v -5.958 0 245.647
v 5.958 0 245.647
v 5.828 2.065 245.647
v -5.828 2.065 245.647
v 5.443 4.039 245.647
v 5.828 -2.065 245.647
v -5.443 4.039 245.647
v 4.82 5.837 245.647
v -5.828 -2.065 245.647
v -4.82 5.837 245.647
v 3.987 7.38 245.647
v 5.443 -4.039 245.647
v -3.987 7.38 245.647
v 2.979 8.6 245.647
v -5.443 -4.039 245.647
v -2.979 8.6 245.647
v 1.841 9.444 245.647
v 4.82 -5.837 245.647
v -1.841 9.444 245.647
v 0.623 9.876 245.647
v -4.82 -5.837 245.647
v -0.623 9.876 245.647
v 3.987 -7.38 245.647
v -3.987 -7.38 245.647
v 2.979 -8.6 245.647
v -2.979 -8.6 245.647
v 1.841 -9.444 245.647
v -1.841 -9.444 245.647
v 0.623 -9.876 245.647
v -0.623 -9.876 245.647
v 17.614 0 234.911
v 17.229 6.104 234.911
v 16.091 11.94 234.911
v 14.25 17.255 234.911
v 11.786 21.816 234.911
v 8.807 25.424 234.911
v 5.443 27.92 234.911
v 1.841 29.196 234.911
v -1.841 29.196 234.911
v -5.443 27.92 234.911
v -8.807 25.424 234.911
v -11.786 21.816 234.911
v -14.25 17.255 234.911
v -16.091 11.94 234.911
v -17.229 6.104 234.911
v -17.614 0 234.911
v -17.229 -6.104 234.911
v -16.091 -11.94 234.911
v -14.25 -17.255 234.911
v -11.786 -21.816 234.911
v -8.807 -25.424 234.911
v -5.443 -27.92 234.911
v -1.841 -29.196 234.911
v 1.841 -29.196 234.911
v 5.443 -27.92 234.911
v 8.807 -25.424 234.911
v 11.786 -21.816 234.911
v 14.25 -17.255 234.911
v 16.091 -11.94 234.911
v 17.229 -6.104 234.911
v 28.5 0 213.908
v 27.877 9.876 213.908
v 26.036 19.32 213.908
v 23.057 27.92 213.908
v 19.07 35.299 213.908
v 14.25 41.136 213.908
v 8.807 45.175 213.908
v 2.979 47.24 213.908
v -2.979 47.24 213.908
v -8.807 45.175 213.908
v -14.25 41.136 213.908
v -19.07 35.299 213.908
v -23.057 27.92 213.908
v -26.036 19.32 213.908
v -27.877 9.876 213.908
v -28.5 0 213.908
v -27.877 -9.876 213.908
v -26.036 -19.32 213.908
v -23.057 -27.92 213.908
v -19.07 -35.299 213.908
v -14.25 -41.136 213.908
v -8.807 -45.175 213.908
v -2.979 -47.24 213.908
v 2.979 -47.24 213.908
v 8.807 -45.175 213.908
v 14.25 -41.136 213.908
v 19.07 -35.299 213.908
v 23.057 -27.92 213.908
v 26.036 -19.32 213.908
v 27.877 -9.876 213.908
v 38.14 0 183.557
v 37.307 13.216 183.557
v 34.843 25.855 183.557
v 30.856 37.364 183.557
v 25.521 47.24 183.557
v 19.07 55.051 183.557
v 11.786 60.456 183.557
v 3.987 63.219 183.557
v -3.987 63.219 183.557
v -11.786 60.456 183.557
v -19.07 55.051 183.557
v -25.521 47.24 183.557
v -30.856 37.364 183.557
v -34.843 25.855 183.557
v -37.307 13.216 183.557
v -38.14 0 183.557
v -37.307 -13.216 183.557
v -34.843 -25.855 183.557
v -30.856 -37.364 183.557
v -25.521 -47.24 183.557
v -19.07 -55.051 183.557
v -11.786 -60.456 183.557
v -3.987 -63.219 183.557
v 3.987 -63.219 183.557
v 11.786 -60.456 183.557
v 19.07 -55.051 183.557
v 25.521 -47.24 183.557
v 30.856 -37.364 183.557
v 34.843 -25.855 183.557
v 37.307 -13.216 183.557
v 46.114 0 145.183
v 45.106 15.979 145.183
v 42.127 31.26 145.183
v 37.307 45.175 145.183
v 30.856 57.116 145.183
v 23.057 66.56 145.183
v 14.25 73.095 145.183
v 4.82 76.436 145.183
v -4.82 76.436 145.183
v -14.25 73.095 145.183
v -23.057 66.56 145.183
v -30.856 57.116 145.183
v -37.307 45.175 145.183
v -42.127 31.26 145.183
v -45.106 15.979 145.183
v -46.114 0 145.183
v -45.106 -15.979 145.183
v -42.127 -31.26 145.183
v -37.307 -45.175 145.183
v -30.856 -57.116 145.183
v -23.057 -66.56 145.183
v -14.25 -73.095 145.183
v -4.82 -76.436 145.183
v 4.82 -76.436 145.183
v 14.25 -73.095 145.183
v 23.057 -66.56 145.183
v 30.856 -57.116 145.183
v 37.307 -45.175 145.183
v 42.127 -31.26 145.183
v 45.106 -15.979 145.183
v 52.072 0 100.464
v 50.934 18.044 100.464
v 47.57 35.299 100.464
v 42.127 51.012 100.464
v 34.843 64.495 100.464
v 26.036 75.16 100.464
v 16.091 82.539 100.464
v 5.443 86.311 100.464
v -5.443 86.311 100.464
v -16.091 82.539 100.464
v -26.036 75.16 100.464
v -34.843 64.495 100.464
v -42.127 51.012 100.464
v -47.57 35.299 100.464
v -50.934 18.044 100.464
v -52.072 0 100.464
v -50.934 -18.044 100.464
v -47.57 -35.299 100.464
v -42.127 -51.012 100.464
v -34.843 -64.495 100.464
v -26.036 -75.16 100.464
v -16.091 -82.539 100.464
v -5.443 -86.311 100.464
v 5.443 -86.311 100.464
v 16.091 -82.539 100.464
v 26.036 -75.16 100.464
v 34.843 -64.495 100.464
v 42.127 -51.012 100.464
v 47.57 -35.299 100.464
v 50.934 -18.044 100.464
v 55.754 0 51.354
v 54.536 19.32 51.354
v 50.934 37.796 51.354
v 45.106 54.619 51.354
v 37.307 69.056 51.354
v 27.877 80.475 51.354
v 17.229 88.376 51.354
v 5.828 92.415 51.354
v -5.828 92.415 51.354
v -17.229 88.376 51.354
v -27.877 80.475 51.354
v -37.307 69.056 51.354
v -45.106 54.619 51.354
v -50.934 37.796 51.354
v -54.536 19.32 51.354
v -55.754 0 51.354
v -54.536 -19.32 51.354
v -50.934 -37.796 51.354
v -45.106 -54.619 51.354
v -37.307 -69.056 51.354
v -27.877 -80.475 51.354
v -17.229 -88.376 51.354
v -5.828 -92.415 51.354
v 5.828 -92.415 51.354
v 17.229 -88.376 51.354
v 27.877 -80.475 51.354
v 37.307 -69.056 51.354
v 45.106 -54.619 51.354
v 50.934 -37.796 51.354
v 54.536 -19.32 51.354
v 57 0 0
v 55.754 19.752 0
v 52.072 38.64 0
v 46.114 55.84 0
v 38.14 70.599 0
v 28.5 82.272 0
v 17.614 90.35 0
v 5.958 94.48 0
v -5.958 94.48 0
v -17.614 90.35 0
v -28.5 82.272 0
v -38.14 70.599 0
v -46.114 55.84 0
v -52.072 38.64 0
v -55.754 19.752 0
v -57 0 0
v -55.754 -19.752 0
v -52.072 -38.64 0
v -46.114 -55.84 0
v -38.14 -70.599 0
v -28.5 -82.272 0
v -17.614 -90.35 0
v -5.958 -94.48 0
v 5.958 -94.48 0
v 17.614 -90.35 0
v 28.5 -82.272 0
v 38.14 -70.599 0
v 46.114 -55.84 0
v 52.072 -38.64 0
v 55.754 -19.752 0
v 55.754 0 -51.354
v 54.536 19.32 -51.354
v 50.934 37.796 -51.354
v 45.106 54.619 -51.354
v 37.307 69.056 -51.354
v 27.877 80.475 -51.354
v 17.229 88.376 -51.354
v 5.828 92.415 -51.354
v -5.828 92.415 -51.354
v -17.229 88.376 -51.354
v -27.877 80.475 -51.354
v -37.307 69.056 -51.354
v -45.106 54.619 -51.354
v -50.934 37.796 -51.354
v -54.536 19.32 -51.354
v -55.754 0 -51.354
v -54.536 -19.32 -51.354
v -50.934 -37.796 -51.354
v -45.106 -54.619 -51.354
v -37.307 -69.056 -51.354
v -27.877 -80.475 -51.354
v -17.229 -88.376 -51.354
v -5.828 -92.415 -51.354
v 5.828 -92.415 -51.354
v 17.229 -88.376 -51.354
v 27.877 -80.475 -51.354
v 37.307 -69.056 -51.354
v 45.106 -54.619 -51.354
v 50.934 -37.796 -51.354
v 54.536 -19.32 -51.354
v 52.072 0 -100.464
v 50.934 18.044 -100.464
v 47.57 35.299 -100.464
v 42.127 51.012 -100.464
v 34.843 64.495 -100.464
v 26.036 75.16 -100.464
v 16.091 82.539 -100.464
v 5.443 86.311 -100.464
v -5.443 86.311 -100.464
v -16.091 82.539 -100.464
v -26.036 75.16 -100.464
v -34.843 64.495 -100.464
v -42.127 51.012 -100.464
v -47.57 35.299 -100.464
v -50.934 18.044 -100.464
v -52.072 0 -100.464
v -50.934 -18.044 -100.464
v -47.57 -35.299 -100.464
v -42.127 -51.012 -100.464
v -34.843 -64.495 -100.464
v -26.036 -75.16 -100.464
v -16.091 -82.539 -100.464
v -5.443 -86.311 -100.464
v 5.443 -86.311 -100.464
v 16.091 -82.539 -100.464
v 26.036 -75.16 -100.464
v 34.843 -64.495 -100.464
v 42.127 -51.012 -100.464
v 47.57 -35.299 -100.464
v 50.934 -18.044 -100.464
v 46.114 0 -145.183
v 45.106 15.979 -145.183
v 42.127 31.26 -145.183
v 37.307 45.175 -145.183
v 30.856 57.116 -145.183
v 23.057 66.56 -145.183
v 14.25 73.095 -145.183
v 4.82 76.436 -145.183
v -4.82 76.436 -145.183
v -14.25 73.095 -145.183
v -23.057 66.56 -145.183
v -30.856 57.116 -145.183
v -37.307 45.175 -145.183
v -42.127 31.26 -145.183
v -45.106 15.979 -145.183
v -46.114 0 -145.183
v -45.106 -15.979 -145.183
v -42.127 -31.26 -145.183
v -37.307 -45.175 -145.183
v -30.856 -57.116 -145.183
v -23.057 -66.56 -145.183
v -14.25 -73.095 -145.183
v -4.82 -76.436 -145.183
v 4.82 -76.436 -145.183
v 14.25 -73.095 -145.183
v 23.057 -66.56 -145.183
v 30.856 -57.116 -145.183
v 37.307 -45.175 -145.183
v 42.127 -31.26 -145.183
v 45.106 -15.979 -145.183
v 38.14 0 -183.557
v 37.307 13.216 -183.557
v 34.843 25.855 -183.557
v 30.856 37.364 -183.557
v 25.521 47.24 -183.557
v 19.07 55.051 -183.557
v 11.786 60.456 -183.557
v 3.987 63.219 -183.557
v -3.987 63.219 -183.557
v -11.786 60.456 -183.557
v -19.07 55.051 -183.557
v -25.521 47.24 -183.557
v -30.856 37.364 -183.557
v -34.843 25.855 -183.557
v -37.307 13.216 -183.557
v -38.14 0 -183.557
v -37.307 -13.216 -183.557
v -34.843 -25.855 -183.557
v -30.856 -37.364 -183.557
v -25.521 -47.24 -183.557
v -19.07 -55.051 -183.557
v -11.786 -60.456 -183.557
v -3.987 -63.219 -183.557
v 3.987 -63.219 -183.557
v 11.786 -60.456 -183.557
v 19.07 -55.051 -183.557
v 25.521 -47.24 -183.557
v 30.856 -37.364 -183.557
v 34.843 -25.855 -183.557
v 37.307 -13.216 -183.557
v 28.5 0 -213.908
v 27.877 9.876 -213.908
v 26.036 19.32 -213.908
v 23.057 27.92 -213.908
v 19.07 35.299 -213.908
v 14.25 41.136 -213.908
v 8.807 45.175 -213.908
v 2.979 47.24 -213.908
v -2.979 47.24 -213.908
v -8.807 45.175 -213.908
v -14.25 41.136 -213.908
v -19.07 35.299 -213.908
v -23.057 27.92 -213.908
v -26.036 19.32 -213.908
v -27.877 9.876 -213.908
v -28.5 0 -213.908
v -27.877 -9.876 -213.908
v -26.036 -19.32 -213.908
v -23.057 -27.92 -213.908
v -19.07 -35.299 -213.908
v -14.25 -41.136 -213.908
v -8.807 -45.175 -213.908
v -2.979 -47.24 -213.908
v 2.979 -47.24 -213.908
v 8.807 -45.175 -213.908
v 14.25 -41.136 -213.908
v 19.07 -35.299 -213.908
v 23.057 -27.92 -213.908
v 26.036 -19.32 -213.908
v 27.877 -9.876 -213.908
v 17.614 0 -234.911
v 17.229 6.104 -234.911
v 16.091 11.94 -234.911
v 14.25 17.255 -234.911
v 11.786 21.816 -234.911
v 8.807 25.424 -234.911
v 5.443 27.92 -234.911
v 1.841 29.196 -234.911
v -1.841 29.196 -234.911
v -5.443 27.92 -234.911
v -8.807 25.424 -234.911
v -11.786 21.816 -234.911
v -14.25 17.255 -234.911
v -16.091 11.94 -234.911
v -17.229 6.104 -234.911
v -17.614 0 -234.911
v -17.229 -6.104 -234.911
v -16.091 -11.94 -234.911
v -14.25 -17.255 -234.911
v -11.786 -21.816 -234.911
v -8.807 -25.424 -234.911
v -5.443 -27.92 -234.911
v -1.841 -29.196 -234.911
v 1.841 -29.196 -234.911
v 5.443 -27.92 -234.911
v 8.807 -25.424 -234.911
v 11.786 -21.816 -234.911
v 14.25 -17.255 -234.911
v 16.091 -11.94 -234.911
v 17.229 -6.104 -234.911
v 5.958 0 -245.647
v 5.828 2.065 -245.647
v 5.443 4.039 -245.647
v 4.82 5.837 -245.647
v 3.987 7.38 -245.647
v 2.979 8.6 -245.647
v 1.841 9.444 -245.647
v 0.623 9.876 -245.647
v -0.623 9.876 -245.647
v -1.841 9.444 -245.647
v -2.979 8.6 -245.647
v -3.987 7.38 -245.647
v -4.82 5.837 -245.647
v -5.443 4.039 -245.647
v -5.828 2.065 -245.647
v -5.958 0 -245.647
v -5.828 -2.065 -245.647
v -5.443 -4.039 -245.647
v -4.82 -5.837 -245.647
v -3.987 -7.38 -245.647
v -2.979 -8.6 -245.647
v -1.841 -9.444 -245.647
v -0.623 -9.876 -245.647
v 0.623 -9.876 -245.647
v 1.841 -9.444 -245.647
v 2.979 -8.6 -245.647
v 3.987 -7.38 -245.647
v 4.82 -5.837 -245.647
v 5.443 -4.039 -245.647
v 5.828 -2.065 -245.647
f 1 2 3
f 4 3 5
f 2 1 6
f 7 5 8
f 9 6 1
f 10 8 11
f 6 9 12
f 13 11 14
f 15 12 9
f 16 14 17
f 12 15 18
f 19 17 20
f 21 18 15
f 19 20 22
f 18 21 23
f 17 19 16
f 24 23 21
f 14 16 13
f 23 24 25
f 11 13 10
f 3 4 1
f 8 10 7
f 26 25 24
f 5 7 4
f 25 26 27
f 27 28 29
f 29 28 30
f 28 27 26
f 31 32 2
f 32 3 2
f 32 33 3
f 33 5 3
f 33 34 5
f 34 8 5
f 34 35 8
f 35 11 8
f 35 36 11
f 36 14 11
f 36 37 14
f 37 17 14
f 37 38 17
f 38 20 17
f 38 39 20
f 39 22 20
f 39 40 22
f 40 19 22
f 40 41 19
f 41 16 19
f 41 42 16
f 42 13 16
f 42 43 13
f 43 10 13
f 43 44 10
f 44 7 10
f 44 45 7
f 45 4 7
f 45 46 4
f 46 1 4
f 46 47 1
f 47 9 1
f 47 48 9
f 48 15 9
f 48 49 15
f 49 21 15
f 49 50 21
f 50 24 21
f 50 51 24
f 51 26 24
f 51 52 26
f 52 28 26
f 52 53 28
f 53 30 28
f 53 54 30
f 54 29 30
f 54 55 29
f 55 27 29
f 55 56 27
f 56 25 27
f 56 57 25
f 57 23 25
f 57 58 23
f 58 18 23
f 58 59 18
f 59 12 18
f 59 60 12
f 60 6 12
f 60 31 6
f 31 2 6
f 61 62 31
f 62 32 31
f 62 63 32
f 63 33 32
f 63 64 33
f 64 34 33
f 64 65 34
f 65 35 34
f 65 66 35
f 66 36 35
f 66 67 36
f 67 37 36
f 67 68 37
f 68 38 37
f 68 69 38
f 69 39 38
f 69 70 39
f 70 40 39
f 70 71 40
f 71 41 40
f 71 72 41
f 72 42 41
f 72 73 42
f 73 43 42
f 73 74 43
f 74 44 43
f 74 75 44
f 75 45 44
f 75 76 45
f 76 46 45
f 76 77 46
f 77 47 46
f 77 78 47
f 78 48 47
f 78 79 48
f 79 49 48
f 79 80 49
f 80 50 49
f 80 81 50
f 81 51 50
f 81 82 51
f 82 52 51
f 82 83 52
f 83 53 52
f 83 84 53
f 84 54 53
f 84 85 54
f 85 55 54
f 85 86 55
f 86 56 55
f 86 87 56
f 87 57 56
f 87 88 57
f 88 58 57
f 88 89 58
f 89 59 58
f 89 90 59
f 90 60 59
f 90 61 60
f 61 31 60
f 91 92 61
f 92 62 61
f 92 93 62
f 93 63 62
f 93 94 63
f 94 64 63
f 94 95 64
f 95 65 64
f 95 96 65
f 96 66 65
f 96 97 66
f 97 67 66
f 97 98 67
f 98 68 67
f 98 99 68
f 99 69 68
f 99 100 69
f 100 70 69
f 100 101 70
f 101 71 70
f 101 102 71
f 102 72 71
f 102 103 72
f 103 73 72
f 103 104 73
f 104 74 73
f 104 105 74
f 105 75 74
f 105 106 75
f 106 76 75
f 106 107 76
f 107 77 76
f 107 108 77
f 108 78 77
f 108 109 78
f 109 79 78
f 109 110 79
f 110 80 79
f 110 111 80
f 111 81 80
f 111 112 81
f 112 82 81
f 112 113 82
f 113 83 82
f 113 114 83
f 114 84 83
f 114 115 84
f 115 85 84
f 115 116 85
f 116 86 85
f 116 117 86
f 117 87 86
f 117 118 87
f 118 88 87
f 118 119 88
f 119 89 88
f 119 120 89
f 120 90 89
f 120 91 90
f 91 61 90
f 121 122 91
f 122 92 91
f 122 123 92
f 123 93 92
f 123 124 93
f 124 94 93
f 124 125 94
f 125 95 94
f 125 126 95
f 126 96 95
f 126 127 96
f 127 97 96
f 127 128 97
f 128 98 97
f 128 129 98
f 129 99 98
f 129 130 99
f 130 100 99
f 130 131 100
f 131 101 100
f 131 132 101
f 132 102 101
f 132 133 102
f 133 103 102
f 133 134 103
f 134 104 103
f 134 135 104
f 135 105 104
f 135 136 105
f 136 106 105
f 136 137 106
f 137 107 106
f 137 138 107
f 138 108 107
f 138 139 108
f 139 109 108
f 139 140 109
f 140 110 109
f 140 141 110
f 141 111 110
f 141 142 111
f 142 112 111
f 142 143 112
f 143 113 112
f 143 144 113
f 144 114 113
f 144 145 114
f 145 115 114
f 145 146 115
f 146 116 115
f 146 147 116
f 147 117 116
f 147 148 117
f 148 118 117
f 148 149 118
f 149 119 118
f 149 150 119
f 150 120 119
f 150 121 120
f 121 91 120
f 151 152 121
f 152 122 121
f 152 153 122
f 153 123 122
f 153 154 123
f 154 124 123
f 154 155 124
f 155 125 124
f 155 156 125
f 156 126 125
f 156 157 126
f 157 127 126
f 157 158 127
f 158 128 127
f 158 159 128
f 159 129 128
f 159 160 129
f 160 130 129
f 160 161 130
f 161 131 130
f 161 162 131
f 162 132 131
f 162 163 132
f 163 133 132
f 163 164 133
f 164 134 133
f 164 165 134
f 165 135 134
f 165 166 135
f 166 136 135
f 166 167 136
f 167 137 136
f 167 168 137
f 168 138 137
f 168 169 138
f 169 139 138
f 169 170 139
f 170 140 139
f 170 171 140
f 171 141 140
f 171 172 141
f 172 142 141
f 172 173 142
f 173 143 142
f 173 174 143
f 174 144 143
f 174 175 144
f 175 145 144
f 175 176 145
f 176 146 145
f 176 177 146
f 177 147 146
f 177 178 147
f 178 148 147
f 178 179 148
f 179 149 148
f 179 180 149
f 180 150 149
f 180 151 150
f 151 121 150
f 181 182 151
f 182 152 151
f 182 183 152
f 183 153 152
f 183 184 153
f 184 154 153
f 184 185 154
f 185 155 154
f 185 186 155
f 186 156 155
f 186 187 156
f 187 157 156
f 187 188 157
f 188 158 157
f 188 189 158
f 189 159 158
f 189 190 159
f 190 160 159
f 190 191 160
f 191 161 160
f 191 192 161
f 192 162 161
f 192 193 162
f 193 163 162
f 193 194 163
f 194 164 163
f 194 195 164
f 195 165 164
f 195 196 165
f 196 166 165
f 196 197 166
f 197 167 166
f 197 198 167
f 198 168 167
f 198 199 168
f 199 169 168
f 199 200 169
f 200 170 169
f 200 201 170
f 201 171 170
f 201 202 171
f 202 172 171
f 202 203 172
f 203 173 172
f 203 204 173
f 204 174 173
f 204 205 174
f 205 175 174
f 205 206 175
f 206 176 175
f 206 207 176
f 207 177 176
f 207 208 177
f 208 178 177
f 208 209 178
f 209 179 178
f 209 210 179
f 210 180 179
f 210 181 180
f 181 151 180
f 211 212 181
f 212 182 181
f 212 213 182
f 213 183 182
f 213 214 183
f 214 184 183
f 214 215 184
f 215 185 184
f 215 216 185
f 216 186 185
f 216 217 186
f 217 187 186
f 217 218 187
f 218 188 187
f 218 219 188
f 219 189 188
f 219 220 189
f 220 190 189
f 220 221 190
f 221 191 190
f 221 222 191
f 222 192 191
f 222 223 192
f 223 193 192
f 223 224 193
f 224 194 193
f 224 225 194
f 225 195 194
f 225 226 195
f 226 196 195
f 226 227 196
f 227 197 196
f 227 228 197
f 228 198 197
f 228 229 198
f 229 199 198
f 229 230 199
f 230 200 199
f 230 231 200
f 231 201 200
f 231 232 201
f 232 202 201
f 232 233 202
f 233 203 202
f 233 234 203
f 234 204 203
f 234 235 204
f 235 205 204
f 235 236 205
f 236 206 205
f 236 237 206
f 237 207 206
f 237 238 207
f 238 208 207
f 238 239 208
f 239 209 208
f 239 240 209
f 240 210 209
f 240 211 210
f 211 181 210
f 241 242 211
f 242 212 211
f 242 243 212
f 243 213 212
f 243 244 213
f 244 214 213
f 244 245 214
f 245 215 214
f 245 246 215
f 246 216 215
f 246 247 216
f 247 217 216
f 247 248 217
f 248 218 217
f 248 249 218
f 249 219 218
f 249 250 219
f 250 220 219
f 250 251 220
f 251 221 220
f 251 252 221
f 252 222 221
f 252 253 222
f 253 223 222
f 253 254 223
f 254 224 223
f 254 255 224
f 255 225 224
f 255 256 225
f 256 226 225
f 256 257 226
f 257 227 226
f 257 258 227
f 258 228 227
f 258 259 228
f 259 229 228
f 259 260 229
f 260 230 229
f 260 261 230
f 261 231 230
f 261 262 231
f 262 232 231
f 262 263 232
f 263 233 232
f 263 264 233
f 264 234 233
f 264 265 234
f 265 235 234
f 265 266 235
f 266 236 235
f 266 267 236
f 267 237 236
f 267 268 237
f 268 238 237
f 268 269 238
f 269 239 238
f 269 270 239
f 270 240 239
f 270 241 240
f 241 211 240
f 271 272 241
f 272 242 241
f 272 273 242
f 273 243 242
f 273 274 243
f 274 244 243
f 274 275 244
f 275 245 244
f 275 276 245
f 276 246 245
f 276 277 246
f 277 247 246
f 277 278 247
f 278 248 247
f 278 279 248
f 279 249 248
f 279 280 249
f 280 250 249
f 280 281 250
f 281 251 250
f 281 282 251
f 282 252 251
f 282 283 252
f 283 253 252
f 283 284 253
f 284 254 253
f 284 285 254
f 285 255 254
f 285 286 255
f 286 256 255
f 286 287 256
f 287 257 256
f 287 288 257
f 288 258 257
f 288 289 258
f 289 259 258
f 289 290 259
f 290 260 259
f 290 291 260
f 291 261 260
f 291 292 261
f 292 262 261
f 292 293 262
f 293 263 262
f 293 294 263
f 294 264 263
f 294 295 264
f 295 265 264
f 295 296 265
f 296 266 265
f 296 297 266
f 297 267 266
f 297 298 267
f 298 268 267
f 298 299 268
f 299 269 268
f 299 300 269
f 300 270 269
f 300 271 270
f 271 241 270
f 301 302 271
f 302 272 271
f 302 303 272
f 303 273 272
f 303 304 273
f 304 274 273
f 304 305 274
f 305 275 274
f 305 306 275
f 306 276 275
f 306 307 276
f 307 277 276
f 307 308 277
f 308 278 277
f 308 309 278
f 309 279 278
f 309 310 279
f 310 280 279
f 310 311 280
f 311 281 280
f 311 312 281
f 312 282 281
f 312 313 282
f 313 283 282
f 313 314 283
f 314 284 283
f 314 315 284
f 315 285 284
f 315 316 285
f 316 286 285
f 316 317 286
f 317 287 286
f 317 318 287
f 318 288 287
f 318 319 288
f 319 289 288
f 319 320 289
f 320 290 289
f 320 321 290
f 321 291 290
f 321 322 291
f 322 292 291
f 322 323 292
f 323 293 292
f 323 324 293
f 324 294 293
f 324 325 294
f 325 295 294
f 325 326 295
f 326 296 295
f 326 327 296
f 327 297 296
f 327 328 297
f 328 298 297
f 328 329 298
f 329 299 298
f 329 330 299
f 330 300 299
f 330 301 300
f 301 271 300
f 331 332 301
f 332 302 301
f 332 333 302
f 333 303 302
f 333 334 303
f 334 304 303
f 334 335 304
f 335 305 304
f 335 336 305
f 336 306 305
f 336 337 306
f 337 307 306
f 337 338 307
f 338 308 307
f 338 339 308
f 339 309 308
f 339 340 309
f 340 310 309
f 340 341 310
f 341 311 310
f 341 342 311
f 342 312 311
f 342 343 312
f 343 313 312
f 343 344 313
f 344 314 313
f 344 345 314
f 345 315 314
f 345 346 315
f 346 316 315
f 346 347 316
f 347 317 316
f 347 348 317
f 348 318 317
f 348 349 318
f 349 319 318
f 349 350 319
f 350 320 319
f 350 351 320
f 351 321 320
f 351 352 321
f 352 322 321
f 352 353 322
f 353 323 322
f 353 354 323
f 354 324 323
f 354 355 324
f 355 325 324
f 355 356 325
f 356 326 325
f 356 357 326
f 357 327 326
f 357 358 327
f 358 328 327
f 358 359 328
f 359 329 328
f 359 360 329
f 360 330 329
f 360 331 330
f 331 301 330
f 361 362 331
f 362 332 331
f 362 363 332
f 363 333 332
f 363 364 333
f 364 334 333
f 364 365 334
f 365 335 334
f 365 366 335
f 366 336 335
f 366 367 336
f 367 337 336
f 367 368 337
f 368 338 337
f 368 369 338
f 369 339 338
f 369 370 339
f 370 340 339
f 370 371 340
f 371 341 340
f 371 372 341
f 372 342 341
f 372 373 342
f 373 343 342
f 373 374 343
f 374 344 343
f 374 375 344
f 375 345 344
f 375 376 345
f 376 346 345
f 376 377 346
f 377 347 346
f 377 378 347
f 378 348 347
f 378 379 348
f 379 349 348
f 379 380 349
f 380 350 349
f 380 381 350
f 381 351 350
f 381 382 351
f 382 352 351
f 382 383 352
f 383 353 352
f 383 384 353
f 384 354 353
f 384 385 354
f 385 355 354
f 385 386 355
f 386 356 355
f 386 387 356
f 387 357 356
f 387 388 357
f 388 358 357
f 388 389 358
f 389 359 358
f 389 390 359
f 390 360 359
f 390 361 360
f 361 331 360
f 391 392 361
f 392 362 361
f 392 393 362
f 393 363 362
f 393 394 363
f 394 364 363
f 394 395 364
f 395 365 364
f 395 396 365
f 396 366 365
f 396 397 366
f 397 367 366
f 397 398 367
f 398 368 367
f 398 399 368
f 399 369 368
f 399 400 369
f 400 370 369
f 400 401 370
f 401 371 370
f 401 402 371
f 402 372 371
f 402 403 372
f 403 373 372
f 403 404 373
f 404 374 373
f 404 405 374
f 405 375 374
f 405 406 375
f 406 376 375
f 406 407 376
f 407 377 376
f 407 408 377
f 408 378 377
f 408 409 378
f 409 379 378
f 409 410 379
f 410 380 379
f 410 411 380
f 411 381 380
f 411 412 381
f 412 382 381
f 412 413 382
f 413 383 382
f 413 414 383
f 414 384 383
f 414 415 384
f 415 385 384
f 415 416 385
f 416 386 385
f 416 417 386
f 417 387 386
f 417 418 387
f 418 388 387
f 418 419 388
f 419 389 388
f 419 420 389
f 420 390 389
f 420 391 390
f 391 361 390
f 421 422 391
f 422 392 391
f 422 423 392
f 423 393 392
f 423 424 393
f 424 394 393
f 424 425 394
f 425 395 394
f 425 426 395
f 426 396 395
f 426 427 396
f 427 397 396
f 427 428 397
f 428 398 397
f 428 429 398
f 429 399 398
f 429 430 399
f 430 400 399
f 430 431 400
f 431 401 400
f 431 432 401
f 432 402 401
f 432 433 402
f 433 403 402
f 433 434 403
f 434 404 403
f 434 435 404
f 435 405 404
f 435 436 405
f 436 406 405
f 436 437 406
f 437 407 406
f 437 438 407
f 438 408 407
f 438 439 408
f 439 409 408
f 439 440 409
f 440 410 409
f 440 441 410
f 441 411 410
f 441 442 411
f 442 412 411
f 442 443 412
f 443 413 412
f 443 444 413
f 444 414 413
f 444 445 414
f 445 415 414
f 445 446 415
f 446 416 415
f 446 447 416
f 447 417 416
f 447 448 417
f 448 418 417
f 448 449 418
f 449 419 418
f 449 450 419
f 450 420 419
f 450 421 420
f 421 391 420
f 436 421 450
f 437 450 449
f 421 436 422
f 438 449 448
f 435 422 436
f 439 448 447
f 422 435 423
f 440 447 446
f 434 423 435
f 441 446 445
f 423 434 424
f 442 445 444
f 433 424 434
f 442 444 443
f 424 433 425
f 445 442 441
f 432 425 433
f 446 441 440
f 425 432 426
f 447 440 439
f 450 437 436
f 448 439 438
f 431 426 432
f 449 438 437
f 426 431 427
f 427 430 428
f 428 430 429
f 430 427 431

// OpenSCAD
// Generated by SolidPython 1.0.1 on 2020-07-29 00:39:25


scale(v = [3, 5, 13]) {
	sphere(r = 19);
}
/***********************************************
*********      SolidPython code:      **********
************************************************
 
# import packages: SolidPython
from solid import *
from solid.utils import *
from itertools import chain, combinations


class Resize:

    def __init__(self, scad_file):
        self.scad_file = scad_file
        #self.scad_file = import_scad(scad_file)
        # cone/cylinder param:
        self.r1 = 0
        self.r2 = 0
        self.h = 0
        # rectangular prism param:
        self.w = 0
        self.l = 0
        # ellipse param:
        self.r = 0

    # import OpenScad code (file name corresponds to shape)


    # classify shape + parameters
    def assign(self, param1, param2, param3):
        if self.scad_file == 'cone.scad':
            self.r1 = param1
            self.r2 = param2
            self.h = param3
        elif self.scad_file == 'cylinder.scad':
            self.r1 = param1
            self.r2 = param2
            self.h = param3
        elif self.scad_file == 'rectangularPrism.scad':
            self.h = param1
            self.l = param2
            self.w = param3
        else:
            self.r = param1
            self.h = param2

    # resize parameters
    def iterate(self):
        x = range(3, 20, 2)
        i = 1
        if self.scad_file == 'cone.scad':
            tempList = list(combinations(x, 2))
            for temp in tempList:
                param1 = temp[0]
                param2 = temp[1]
                filepath = 'produced_scad_files/' + 'cone' + str(param1) + '_' + str(param2) + '_' + '.scad'
                scad_render_to_file(cylinder(h=param1, r1=param2, r2=0), filepath)

        elif self.scad_file == 'cylinder.scad':
            tempList = list(combinations(x, 3))
            for temp in tempList:
                param1 = temp[0]
                param2 = temp[1]
                filepath = 'produced_scad_files/' + 'cylinder' + str(param1) + '_' + str(param2) + '_' + '.scad'
                scad_render_to_file(cylinder(h=param1, r1=param2, r2=param2), filepath)

        elif self.scad_file == 'rectangularPrism.scad':
            tempList = list(combinations(x, 3))
            for temp in tempList:
                param1 = temp[0]
                param2 = temp[1]
                param3 = temp[2]
                filepath = 'produced_scad_files/' + 'rectangularPrism' + str(param1) + '_' + str(param2) + '_' + str(
                    param3) + '.scad'
                scad_render_to_file(cube(size=(param1, param2, param3)), filepath)

        elif self.scad_file == 'ellipse.scad':
            tempList = list(combinations(x, 4))
            for temp in tempList:
                param1 = temp[0]
                param2 = temp[1]
                param3 = temp[2]
                param4 = temp[3]
                filepath = 'produced_scad_files/' + 'ellipse' + str(param1) + '_' + str(param2) + '_' + str(param3) + '_' + str(param4) + '.scad'
                scad_render_to_file(scale([param1, param2, param3])(sphere(r=param4)), filepath)

    def render_to_scadfile(self):
        scad_render_to_file(scad, 'example.scad') 
 
************************************************/
